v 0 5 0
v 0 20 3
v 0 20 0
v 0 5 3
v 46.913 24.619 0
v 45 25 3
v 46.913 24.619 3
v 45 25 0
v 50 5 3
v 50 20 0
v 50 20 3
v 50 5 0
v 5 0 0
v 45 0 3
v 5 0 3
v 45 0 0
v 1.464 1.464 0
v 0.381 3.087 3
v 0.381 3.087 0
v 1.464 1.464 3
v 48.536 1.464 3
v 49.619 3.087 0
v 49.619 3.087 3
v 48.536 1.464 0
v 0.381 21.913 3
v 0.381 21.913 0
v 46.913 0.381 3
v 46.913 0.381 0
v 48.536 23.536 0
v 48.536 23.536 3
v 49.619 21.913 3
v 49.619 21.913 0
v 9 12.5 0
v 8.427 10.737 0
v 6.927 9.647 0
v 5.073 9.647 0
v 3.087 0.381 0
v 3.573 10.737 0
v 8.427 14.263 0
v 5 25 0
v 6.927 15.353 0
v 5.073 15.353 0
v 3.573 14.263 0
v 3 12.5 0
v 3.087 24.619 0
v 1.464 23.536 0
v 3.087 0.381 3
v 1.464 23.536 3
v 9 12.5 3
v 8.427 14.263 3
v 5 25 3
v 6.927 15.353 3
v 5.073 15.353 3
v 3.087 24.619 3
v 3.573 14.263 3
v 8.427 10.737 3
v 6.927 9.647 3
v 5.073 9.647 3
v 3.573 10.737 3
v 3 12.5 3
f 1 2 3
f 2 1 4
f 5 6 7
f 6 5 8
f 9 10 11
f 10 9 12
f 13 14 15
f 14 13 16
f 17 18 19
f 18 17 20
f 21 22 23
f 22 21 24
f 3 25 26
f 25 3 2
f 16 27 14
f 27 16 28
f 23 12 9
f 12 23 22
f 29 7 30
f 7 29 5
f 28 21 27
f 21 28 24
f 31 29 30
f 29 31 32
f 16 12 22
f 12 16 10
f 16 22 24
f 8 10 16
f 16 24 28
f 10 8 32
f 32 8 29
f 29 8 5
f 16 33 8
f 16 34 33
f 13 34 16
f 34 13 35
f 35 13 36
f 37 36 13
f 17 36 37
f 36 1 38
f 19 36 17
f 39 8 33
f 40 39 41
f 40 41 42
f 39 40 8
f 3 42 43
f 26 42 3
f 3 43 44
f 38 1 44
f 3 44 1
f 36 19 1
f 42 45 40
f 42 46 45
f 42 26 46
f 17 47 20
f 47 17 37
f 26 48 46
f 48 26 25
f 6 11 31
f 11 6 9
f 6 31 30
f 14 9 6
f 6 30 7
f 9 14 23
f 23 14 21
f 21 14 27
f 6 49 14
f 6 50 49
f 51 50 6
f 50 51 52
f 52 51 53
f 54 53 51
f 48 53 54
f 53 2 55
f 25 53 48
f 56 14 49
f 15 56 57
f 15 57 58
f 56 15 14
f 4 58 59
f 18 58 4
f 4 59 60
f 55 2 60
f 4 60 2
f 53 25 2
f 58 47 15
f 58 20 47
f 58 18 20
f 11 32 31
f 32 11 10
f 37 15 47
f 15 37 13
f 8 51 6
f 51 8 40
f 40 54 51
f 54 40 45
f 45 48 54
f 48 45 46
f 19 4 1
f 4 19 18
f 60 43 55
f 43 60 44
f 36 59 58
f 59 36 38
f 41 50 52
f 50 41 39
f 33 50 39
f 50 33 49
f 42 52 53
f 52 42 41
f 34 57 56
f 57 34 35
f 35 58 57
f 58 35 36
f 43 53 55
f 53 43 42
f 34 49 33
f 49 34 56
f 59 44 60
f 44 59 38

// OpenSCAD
// Key tag: a plate with rounded corners (hull of four cylinders) and a key-ring hole
length = 50;    // [30:100]
width = 25;     // [15:60]
thickness = 3;  // [1:0.5:6]
corner = 5;     // [1:12]
hole = 3;       // [1:0.5:6]

difference() {
  hull()
    for (x = [corner, length - corner], y = [corner, width - corner])
      translate([x, y, 0]) cylinder(r = corner, h = thickness);
  translate([corner + 1, width / 2, -1]) cylinder(r = hole, h = thickness + 2);
}
